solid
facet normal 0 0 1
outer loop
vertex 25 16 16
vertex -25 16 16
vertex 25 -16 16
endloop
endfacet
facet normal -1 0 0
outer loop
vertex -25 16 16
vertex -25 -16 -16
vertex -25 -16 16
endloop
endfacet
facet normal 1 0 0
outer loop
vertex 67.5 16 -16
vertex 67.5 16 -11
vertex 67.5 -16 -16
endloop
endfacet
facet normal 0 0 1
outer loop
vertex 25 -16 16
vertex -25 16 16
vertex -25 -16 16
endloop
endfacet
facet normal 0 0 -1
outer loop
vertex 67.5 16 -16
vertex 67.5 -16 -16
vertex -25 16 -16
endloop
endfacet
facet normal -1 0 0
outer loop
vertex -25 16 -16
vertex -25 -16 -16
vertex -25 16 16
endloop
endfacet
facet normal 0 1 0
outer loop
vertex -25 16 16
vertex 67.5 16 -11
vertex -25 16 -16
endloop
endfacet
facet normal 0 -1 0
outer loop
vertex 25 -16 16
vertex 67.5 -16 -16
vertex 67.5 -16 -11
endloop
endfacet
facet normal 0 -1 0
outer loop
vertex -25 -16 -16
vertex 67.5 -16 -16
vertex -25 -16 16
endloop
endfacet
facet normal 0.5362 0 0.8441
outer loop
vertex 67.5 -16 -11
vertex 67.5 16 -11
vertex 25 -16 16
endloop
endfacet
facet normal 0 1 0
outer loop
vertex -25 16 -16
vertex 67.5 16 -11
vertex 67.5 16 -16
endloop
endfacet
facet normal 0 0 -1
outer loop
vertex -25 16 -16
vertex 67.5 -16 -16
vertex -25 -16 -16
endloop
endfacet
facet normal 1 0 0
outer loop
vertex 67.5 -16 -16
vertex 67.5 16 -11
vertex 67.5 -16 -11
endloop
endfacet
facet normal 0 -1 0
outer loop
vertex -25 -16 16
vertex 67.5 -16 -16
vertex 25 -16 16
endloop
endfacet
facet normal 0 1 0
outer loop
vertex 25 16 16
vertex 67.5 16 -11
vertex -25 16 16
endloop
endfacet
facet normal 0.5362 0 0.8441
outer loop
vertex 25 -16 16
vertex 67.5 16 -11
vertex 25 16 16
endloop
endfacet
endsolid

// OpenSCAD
// A simplified model for the basic low arm part of Darwin-OP.
// The basic arm is with 3 DOF without gripper at the end. 

module arm_gripper() {
    hull() { 
        cube([50, 32, 32], center = true);
        translate([45, 0, -13.5]) cube([45, 32, 5], center = true);
    }
}

arm_gripper();
